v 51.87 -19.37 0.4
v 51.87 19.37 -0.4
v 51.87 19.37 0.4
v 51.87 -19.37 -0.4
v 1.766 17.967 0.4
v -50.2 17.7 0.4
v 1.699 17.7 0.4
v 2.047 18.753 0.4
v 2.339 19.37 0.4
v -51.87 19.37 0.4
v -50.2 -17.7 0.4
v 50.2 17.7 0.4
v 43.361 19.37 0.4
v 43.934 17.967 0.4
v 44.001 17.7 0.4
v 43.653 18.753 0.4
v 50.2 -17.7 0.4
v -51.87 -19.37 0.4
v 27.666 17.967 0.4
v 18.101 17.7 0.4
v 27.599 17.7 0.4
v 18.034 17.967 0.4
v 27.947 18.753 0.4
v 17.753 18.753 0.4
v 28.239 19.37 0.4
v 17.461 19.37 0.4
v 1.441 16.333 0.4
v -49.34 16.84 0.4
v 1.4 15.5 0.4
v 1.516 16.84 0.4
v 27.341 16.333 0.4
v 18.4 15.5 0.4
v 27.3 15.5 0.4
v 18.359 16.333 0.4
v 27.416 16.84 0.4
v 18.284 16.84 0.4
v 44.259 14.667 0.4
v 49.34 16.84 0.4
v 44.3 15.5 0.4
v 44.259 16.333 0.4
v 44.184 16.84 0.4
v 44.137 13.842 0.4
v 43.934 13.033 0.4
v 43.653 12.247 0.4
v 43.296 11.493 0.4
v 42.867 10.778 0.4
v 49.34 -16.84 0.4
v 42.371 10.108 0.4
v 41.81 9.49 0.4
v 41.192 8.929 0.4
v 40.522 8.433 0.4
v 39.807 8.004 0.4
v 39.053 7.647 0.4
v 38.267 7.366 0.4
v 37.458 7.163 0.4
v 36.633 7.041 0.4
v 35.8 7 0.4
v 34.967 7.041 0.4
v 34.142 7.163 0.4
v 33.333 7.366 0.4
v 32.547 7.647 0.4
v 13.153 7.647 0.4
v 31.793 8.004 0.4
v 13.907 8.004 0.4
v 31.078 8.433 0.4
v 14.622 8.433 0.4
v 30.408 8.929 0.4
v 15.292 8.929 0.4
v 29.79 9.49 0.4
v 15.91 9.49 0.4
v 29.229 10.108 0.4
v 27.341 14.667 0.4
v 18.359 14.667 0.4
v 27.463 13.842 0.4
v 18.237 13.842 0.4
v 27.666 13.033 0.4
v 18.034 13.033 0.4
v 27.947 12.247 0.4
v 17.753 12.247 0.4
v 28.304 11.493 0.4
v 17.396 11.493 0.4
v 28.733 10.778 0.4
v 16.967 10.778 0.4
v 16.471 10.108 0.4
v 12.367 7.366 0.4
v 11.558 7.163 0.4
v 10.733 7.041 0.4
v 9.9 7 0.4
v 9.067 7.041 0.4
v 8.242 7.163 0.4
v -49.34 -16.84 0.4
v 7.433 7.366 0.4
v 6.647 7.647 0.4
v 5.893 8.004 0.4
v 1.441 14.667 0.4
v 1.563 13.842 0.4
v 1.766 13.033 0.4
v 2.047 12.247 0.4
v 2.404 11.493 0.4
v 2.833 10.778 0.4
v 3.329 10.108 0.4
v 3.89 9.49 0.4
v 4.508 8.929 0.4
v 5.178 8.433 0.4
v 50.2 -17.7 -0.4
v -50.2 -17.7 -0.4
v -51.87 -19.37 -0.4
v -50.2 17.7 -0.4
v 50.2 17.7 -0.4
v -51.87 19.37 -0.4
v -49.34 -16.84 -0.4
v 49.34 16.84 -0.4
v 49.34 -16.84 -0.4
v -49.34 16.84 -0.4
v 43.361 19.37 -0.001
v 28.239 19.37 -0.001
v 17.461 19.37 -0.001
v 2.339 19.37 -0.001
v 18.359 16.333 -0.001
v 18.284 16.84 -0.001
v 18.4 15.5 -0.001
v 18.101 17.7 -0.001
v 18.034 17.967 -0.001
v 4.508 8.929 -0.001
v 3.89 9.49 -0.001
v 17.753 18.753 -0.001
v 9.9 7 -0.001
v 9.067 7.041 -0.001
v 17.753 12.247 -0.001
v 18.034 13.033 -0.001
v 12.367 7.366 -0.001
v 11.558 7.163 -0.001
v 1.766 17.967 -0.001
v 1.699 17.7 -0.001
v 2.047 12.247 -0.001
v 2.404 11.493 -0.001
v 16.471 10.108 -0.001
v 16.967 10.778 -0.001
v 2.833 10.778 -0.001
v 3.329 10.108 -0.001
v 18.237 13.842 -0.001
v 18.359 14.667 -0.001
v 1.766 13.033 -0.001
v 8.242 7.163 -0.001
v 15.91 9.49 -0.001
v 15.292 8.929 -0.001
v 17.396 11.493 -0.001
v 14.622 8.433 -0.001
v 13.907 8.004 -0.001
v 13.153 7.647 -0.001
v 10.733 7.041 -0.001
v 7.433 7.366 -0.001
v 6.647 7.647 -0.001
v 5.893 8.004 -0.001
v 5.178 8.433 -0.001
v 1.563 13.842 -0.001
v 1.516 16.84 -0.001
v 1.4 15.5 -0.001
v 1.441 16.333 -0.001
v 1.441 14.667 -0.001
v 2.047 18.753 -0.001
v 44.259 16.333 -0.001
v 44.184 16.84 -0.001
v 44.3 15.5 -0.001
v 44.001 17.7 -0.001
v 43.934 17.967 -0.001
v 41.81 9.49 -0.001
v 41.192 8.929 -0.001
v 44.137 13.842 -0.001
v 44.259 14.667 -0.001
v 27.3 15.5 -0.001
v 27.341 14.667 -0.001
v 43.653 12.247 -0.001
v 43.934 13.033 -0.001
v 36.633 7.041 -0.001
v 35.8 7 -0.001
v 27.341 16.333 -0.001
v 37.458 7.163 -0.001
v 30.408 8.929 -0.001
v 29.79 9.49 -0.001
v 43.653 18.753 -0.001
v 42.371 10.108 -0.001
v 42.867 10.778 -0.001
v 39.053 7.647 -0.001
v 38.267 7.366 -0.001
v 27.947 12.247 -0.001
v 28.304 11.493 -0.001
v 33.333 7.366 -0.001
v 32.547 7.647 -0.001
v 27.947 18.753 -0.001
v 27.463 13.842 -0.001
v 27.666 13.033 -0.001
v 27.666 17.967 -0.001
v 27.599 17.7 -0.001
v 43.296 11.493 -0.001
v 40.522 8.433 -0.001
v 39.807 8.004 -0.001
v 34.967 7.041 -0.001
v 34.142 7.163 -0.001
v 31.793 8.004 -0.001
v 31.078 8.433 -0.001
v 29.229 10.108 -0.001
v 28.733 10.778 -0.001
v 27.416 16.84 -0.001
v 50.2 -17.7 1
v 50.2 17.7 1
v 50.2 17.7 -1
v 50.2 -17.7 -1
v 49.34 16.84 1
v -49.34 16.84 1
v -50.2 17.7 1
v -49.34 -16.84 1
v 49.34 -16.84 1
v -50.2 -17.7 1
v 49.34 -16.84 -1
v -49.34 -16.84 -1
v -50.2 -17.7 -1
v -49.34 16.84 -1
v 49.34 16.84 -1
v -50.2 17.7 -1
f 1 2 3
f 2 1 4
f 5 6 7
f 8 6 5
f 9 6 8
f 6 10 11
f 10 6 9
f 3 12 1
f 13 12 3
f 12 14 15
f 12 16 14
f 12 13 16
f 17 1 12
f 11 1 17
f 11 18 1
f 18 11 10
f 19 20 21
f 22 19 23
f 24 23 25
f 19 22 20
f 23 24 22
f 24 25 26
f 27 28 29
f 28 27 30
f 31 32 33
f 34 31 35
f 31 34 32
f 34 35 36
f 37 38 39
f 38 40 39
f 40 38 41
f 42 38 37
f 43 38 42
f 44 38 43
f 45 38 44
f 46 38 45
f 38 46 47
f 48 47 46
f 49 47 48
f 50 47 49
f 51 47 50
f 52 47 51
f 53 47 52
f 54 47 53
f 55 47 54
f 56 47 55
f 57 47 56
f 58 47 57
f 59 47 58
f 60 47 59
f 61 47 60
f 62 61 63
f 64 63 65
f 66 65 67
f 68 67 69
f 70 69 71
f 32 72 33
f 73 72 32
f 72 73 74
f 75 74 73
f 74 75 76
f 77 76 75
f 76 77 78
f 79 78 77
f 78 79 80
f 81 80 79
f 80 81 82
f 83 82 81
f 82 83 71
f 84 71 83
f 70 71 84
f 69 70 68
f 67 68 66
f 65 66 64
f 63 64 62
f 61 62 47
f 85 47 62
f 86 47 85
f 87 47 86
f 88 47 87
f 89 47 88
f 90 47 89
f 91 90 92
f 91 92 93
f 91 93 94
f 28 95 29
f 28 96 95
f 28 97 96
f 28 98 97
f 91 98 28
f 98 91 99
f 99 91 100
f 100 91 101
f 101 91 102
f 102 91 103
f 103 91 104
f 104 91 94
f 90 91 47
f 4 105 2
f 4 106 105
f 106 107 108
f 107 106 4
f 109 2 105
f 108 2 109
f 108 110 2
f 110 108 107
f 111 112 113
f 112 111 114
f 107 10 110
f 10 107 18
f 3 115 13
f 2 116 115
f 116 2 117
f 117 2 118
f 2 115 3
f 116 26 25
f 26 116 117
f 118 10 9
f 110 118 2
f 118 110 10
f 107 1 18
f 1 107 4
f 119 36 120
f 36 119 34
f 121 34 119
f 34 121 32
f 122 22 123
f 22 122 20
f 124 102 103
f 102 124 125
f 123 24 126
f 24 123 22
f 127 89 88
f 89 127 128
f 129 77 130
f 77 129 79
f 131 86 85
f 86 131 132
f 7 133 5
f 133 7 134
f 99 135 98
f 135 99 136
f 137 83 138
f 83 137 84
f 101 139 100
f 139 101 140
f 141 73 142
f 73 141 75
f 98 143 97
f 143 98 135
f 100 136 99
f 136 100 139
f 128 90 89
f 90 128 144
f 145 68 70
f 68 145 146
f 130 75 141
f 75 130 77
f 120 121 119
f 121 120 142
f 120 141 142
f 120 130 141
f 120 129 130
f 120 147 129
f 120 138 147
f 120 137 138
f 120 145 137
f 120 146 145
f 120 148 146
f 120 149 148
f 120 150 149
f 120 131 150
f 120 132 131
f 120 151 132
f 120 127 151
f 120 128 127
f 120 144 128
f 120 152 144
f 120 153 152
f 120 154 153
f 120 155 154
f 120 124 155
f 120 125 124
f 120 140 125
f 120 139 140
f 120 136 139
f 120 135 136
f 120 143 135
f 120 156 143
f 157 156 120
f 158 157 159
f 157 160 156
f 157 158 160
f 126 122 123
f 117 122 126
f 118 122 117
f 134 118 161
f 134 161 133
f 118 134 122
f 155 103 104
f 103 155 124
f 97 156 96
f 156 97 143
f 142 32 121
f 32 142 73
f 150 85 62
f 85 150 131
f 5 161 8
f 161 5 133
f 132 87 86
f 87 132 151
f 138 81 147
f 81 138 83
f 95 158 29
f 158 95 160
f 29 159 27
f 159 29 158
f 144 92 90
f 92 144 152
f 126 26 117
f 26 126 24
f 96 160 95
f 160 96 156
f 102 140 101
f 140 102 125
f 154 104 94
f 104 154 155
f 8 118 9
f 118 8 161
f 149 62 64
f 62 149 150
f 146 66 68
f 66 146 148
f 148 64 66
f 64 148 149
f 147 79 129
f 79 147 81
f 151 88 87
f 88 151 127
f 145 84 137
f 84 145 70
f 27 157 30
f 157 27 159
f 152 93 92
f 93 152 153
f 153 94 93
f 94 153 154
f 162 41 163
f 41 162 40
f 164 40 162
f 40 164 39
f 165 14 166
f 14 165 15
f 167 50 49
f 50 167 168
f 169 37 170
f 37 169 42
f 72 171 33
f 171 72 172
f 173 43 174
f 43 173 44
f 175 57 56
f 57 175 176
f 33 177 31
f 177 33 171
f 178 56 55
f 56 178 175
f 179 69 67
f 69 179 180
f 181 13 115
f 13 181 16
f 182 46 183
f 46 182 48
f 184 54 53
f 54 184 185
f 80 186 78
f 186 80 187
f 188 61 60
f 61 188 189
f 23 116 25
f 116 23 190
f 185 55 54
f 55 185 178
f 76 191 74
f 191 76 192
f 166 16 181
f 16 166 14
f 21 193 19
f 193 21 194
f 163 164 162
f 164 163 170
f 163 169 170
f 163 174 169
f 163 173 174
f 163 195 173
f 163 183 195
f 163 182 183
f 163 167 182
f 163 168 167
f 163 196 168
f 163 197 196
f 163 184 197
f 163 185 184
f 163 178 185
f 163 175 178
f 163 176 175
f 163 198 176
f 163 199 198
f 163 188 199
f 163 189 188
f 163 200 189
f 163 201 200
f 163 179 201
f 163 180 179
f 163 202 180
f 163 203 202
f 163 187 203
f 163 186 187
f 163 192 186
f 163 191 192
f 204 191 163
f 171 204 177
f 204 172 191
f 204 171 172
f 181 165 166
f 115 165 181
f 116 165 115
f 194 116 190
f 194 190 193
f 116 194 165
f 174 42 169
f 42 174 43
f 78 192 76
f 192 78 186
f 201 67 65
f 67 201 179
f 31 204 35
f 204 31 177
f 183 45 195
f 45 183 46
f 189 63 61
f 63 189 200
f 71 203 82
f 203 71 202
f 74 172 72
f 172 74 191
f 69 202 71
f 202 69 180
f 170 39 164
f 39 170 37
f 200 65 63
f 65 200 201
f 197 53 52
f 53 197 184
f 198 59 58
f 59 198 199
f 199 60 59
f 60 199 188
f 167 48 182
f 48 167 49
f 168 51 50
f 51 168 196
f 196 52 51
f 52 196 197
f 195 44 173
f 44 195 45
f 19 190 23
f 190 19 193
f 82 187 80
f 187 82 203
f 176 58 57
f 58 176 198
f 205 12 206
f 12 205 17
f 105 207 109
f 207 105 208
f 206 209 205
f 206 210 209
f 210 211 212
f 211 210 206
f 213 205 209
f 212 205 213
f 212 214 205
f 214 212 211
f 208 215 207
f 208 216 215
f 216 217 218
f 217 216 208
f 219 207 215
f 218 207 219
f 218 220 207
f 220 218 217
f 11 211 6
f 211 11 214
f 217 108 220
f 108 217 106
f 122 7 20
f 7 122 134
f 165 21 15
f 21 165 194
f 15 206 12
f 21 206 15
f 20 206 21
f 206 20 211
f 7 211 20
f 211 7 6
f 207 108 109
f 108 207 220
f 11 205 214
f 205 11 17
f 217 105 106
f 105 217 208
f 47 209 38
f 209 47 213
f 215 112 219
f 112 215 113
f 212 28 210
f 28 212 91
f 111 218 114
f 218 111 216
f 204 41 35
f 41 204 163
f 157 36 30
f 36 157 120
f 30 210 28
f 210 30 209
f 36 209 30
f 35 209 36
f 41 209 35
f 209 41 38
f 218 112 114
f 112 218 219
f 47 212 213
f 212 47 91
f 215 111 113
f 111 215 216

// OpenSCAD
// file: BOSL2/std.scad
// Minimal BOSL2 compatibility shim for bundled gallery models.
// It implements only the helpers used by the imported OpenSCAD projects.

CENTER = [0, 0, 0];
BOTTOM = [0, 0, -1];
TOP = [0, 0, 1];
LEFT = [-1, 0, 0];
RIGHT = [1, 0, 0];
FRONT = [0, -1, 0];
BACK = [0, 1, 0];

module up(z=0) {
    translate([0, 0, z]) children();
}

module down(z=0) {
    translate([0, 0, -z]) children();
}

module attach(anchor=CENTER) {
    children();
}

module cuboid(size=[1, 1, 1], anchor=CENTER) {
    center = anchor == CENTER;
    translate(center ? [0, 0, 0] : [0, 0, size[2] / 2])
        cube(size, center=true);
    children();
}

module xcyl(h=1, r=1, anchor=CENTER) {
    center = anchor == CENTER;
    translate(center ? [0, 0, 0] : [h / 2, 0, 0])
        rotate([0, 90, 0])
            cylinder(h=h, r=r, center=true);
}
// main file
// -----------------------------------------------------------------------------
// 3D-Model (OpenSCAD) Abdeckung Steuermodul.
//
// Author: Bernhard Bablok
// License: GPL3
//
// Website: https://github.com/bablokb/pcb-adventskranz
//
// -----------------------------------------------------------------------------

include <BOSL2/std.scad>

$fa = 1;
$fs = 0.4;
$fn = 64;
//$fn = 24;

fuzz = 0.001;

// dimensions
w4 = 1.67;           // wall 4 layers
w2 = 0.86;           // wall 2 layers
d  = 0.2;            // delta

x_pcb = 100;         // pcb dimensions
y_pcb = 35;
//h_pcb = 10;
h_pcb = 2;

x_85     = 18.3;     // attiny85 dimensions
y_85     = 24.1;
x_off_85 = 62.8;     // offset of attiny85
y_off_85 = 10.3;

x_off_pins = 73.5;

r = 3;               // edges 3mm rounding
//b = 1.2;             // bottom-plate
b = 0.8;             // bottom-plate

r_sen       = 8.0;   // sensor radius
r_sen_d     = 0.5;   // extra space for sensor
x_off_sen_1 = 1.9;   // x-offset from wall
x_off_sen_2 = 27.8;  // x-offset from wall
y_off_sen   = 7.5;   // y-offset from wall

r_but     = 3.5/2;   // button radius
r_but_d   = 0.3;     // extra space for button
x_off_but = 57.7;    // x-offset from wall
y_off_but = 23.5;    // y-offset from wall


// --- inner void   --------------------------------------------------------------

module inner() {
  difference() {
    // walls
    union() {
      cuboid([x_pcb+2*d,y_pcb+2*d,h_pcb], p1=[-d,-d,-h_pcb+fuzz]);                      // pcb
      cuboid([x_85+2*d,y_85+2*d,h_pcb], p1=[-d+x_off_85-d,-d-y_off_85-d,-h_pcb+fuzz]);  // attiny85
    }
    // inner void
    union() {
      cuboid([x_pcb+2*d-2*w2,y_pcb+2*d-2*w2,h_pcb], p1=[-d+w2,-d+w2,-h_pcb+fuzz]);      // pcb
      cuboid([x_85+2*d-2*w2,y_85+2*d+w2,h_pcb], 
              p1=[-d+x_off_85-d+w2,-d-y_off_85-d+w2,-h_pcb+fuzz]);                     // attiny85
    }
    // remove additional walls
    cuboid([20,y_pcb+2*d-2*w2,h_pcb], p1=[-5,-d+w2,-h_pcb+fuzz]);         // left
    cuboid([x_pcb-w2-w4-x_off_85,y_85+2*d,h_pcb],
            p1=[x_off_85-5,-d-y_off_85-d,-h_pcb+fuzz]);                   // front attiny85
    cuboid([x_pcb-w2-w4-x_off_pins,20,h_pcb],
            p1=[x_off_pins-5,y_pcb-5,-h_pcb+fuzz]);                   // front attiny85
    
  } 
}

// --- outer shell   ------------------------------------------------------------

module outer() {
  cuboid(
      [x_pcb+2*d+2*w4,y_pcb+2*d+2*w4,b], p1=[-d-w4,-d-w4,0],
      rounding=r,
      edges=[LEFT+FRONT,RIGHT+FRONT,LEFT+BACK,RIGHT+BACK]
  );
  cuboid(
      [x_85+2*d+2*w4,y_85+2*d+2*w4,b], p1=[-d+x_off_85-d-w4,-d-y_off_85-d-w4,0],
      rounding=r,
      edges=[LEFT+FRONT,RIGHT+FRONT,LEFT+BACK,RIGHT+BACK]
  );
}

difference() {
  outer();
  translate([x_off_sen_1+r_sen,r_sen+y_off_sen,-fuzz])
                                      cylinder(b+2*fuzz,r1=r_sen+r_sen_d,r2=r_sen+r_sen_d);
  translate([x_off_sen_2+r_sen,r_sen+y_off_sen,-fuzz])
                                      cylinder(b+2*fuzz,r1=r_sen+r_sen_d,r2=r_sen+r_sen_d);
  translate([x_off_but+r_but,r_but+y_off_but,-fuzz])
                                      cylinder(b+2*fuzz,r1=r_but+r_but_d,r2=r_but+r_but_d);
}
inner();
